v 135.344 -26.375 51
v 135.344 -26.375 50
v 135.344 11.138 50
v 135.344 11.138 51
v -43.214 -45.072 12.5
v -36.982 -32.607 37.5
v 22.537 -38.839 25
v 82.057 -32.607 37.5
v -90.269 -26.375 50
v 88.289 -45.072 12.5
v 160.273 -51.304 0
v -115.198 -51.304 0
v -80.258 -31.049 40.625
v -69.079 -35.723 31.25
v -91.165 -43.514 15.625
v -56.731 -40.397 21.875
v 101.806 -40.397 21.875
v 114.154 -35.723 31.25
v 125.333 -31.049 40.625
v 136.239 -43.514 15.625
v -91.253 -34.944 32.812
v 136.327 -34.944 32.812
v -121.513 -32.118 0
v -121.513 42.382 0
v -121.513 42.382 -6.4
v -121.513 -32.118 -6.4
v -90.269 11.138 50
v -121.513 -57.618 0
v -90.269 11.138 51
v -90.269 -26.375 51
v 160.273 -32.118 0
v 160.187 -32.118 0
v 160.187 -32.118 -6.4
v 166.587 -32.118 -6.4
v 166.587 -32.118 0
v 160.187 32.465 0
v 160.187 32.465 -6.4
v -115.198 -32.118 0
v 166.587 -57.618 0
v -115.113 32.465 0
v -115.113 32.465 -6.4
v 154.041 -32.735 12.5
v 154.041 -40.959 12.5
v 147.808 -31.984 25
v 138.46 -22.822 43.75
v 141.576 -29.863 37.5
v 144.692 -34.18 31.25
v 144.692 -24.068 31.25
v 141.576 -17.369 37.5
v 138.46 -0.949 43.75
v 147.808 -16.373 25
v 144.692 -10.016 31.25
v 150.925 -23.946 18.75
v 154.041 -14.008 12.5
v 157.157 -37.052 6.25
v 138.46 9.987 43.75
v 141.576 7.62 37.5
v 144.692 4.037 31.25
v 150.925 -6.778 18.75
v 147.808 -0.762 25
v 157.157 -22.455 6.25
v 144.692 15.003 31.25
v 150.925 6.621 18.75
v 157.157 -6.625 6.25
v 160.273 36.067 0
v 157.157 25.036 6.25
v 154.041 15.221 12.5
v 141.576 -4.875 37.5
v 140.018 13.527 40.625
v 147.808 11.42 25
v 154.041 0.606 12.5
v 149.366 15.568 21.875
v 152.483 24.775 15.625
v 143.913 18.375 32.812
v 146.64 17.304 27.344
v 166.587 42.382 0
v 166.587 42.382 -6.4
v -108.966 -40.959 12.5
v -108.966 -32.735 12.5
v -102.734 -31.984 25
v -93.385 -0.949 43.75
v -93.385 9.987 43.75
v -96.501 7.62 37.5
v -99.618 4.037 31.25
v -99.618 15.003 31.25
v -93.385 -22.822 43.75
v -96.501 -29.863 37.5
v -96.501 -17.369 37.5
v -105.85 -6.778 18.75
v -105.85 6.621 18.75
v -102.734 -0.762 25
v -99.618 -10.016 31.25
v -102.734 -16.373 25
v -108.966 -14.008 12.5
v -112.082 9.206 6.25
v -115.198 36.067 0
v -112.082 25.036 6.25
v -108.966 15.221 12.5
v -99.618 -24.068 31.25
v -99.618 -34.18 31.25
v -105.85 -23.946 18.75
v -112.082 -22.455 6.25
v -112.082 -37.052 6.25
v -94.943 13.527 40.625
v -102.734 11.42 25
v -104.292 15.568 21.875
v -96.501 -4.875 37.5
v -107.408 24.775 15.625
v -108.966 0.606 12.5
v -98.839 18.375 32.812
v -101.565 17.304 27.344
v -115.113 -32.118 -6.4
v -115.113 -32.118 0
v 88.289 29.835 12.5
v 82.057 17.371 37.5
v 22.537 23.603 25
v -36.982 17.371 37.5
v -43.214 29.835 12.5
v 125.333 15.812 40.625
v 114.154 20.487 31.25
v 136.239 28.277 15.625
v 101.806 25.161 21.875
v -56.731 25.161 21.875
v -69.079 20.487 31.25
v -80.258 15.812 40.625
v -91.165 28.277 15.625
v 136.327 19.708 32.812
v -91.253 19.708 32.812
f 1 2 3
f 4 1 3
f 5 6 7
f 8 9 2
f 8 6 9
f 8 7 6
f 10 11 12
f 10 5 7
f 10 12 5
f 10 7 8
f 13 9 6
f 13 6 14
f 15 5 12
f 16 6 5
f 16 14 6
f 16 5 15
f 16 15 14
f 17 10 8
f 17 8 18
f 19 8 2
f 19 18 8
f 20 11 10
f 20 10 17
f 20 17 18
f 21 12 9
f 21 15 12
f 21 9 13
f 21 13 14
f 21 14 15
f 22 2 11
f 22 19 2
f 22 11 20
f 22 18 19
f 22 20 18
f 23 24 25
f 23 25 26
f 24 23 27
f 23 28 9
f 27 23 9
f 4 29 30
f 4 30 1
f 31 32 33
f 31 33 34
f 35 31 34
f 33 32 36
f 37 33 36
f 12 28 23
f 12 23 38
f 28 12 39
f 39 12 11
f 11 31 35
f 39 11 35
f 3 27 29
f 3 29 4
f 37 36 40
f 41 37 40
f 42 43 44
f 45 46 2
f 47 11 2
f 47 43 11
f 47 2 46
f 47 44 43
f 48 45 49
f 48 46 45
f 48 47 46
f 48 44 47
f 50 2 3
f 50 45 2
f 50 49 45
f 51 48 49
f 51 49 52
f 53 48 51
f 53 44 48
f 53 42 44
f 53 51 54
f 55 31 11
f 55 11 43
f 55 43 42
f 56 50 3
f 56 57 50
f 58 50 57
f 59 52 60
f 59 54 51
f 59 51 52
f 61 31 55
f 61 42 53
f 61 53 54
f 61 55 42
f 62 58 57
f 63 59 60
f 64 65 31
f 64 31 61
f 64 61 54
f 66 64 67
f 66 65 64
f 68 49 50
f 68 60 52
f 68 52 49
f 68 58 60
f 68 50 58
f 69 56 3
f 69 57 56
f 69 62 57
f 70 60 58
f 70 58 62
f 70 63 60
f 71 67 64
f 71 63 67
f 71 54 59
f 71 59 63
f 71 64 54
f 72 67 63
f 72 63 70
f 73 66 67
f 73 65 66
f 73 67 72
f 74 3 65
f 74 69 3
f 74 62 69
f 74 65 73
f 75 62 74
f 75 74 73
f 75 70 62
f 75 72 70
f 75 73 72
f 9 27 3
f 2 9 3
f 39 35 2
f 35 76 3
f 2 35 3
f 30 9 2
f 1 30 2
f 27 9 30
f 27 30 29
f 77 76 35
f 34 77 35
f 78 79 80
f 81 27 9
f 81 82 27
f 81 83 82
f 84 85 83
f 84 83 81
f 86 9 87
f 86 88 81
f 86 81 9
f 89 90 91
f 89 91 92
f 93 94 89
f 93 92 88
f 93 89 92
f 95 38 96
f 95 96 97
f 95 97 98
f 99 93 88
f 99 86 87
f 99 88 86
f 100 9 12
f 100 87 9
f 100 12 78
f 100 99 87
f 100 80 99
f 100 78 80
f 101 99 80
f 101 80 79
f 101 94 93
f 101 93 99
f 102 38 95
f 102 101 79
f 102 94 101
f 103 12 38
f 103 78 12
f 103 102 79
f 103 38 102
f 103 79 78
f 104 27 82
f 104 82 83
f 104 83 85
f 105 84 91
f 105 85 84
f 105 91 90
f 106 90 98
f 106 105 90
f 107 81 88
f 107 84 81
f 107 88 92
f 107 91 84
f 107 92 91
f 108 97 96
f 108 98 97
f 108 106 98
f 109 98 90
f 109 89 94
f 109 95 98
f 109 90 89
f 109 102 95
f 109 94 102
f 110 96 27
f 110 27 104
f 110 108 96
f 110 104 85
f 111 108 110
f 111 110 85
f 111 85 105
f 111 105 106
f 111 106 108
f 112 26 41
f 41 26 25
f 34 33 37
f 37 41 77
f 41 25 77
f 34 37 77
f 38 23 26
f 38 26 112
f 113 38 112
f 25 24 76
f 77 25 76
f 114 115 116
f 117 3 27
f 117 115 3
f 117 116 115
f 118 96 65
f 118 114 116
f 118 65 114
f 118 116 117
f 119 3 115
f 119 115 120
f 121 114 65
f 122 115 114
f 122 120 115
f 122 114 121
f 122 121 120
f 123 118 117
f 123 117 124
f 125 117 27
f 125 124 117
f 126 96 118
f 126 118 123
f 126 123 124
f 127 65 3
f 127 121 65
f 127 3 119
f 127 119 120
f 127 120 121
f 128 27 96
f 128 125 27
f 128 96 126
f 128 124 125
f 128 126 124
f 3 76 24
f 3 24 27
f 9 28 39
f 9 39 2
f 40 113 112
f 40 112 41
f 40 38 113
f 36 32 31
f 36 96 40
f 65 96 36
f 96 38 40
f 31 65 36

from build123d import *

# Parameters (mm, degrees)
SKETCH1_W           = 288.1
SKETCH1_H           = 100
BOSS_EXTRUDE1_DEPTH = 50
BOSS_EXTRUDE1_TAPER = 32
SKETCH2_W           = 225.613064809
SKETCH2_H           = 37.513064809
CUT_EXTRUDE1_DEPTH  = 50
CUT_EXTRUDE1_TAPER  = -26.5
BOSS_EXTRUDE2_DEPTH = 6.4
SKETCH5_W           = 225.613064809
SKETCH5_H           = 37.513064809
BOSS_EXTRUDE3_DEPTH = 1


with BuildPart() as part:
    # Sketch1 → Boss-Extrude1 (new body)
    with BuildSketch(Plane.XY):
        with Locations((22.537303057, -7.618243287)):
            Rectangle(SKETCH1_W, SKETCH1_H)
    extrude(amount=BOSS_EXTRUDE1_DEPTH, taper=BOSS_EXTRUDE1_TAPER)

    # Sketch2 → Cut-Extrude1 (cut)
    with BuildSketch(Plane.XY.offset(50)):
        with Locations((22.537303058, -7.618243286)):
            Rectangle(SKETCH2_W, SKETCH2_H)
    extrude(amount=-CUT_EXTRUDE1_DEPTH, taper=CUT_EXTRUDE1_TAPER, mode=Mode.SUBTRACT)

    # Sketch3 → Boss-Extrude2 (add)
    with BuildSketch(Plane(origin=(0, 0, 0), x_dir=(-1, 0, 0), z_dir=(0, 0, -1))):
        Polygon((-166.587303057, 42.381756713), (117.996036654, 42.381756713), (121.512696943, 42.381756713), (121.512696943, -32.118243287), (115.112696943, -32.118243287), (115.112696943, 32.465096425), (111.596036654, 32.465096425), (-160.187303057, 32.465096425), (-160.187303057, -7.618243287), (-160.187303057, -32.118243287), (-166.587303057, -32.118243287), (-166.587303057, -7.618243287), (-166.587303057, 32.465096425), align=None)
    extrude(amount=BOSS_EXTRUDE2_DEPTH)


with BuildPart() as body_2:
    # Sketch5 → Boss-Extrude3 (new body)
    with BuildSketch(Plane.XY.offset(50)):
        with Locations((22.537303058, -7.618243286)):
            Rectangle(SKETCH5_W, SKETCH5_H)
    extrude(amount=BOSS_EXTRUDE3_DEPTH)


solid = Compound([part.part, body_2.part])
